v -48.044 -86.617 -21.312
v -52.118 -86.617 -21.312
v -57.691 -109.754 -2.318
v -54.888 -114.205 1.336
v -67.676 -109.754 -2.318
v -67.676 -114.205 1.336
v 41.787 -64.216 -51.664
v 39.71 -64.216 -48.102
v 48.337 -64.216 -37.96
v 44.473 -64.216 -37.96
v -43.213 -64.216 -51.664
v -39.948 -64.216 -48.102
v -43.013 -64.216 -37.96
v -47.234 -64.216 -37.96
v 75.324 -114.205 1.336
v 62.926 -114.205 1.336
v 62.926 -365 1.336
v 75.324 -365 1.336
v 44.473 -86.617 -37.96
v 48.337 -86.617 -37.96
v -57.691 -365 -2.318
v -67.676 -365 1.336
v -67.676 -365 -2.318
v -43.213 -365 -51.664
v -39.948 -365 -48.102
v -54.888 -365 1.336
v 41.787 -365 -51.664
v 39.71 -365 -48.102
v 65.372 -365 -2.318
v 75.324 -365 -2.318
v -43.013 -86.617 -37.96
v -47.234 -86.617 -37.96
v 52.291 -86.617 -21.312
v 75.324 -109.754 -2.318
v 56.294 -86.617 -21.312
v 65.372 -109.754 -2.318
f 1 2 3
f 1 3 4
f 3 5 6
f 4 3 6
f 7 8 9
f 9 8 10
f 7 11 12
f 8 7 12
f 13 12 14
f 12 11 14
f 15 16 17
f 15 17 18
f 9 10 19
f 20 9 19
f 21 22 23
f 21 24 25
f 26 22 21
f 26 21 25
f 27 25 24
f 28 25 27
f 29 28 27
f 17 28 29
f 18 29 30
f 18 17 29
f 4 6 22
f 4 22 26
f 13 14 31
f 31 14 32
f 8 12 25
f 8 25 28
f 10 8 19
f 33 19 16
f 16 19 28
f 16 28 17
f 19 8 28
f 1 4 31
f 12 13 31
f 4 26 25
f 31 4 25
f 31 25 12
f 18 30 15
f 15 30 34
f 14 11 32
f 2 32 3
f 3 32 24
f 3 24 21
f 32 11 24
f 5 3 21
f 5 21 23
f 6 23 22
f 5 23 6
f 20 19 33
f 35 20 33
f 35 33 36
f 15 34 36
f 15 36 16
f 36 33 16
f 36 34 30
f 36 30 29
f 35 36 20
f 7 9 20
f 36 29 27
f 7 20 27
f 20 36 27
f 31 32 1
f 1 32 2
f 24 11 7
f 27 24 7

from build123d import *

# Parameters (mm, degrees)
F0_W     = 143
F0_H     = 53
F1_DEPTH = 365
F3_DEPTH = 143.001
F5_DEPTH = 300.785325
F6_DEPTH = 300.785325


with BuildPart() as f1:
    # F0 (on Front) → F1 (new body)
    with BuildSketch(Plane.XZ):
        with Locations((3.823606, -25.164385)):
            Rectangle(F0_W, F0_H)
    extrude(amount=F1_DEPTH)

    # F2 (on face) → F3 (cut, through all)
    with BuildSketch(Plane(origin=(-67.676394, 0, 0), x_dir=(0, -1, 0), z_dir=(-1, 0, 0))):
        Polygon((0, -51.664385), (64.215675, -51.664385), (64.215675, -37.959635), (86.616777, -37.959635), (86.616777, -21.311939), (114.20504, 1.335615), (0, 1.335615), (0, -16.486794), (0, -25.164385), align=None)
    extrude(amount=-F3_DEPTH, mode=Mode.SUBTRACT)

    # F4 (on face) → F5 (cut, through all)
    with BuildSketch(Plane.XZ.offset(365)):
        Polygon((-57.691015, -2.318196), (-67.676394, -2.318196), (-67.676394, -51.664385), (-43.213006, -51.664385), align=None)
        Polygon((65.37208, -2.318196), (41.786994, -51.664385), (75.323606, -51.664385), (75.323606, -2.318196), align=None)
    extrude(amount=-F5_DEPTH, mode=Mode.SUBTRACT)

    # F4 (on face) → F6 (cut, through all)
    with BuildSketch(Plane.XZ.offset(365)):
        Polygon((62.925503, 1.335615), (-54.888126, 1.335615), (-39.947845, -48.101962), (39.710268, -48.101962), align=None)
    extrude(amount=-F6_DEPTH, mode=Mode.SUBTRACT)


solid = f1.part
